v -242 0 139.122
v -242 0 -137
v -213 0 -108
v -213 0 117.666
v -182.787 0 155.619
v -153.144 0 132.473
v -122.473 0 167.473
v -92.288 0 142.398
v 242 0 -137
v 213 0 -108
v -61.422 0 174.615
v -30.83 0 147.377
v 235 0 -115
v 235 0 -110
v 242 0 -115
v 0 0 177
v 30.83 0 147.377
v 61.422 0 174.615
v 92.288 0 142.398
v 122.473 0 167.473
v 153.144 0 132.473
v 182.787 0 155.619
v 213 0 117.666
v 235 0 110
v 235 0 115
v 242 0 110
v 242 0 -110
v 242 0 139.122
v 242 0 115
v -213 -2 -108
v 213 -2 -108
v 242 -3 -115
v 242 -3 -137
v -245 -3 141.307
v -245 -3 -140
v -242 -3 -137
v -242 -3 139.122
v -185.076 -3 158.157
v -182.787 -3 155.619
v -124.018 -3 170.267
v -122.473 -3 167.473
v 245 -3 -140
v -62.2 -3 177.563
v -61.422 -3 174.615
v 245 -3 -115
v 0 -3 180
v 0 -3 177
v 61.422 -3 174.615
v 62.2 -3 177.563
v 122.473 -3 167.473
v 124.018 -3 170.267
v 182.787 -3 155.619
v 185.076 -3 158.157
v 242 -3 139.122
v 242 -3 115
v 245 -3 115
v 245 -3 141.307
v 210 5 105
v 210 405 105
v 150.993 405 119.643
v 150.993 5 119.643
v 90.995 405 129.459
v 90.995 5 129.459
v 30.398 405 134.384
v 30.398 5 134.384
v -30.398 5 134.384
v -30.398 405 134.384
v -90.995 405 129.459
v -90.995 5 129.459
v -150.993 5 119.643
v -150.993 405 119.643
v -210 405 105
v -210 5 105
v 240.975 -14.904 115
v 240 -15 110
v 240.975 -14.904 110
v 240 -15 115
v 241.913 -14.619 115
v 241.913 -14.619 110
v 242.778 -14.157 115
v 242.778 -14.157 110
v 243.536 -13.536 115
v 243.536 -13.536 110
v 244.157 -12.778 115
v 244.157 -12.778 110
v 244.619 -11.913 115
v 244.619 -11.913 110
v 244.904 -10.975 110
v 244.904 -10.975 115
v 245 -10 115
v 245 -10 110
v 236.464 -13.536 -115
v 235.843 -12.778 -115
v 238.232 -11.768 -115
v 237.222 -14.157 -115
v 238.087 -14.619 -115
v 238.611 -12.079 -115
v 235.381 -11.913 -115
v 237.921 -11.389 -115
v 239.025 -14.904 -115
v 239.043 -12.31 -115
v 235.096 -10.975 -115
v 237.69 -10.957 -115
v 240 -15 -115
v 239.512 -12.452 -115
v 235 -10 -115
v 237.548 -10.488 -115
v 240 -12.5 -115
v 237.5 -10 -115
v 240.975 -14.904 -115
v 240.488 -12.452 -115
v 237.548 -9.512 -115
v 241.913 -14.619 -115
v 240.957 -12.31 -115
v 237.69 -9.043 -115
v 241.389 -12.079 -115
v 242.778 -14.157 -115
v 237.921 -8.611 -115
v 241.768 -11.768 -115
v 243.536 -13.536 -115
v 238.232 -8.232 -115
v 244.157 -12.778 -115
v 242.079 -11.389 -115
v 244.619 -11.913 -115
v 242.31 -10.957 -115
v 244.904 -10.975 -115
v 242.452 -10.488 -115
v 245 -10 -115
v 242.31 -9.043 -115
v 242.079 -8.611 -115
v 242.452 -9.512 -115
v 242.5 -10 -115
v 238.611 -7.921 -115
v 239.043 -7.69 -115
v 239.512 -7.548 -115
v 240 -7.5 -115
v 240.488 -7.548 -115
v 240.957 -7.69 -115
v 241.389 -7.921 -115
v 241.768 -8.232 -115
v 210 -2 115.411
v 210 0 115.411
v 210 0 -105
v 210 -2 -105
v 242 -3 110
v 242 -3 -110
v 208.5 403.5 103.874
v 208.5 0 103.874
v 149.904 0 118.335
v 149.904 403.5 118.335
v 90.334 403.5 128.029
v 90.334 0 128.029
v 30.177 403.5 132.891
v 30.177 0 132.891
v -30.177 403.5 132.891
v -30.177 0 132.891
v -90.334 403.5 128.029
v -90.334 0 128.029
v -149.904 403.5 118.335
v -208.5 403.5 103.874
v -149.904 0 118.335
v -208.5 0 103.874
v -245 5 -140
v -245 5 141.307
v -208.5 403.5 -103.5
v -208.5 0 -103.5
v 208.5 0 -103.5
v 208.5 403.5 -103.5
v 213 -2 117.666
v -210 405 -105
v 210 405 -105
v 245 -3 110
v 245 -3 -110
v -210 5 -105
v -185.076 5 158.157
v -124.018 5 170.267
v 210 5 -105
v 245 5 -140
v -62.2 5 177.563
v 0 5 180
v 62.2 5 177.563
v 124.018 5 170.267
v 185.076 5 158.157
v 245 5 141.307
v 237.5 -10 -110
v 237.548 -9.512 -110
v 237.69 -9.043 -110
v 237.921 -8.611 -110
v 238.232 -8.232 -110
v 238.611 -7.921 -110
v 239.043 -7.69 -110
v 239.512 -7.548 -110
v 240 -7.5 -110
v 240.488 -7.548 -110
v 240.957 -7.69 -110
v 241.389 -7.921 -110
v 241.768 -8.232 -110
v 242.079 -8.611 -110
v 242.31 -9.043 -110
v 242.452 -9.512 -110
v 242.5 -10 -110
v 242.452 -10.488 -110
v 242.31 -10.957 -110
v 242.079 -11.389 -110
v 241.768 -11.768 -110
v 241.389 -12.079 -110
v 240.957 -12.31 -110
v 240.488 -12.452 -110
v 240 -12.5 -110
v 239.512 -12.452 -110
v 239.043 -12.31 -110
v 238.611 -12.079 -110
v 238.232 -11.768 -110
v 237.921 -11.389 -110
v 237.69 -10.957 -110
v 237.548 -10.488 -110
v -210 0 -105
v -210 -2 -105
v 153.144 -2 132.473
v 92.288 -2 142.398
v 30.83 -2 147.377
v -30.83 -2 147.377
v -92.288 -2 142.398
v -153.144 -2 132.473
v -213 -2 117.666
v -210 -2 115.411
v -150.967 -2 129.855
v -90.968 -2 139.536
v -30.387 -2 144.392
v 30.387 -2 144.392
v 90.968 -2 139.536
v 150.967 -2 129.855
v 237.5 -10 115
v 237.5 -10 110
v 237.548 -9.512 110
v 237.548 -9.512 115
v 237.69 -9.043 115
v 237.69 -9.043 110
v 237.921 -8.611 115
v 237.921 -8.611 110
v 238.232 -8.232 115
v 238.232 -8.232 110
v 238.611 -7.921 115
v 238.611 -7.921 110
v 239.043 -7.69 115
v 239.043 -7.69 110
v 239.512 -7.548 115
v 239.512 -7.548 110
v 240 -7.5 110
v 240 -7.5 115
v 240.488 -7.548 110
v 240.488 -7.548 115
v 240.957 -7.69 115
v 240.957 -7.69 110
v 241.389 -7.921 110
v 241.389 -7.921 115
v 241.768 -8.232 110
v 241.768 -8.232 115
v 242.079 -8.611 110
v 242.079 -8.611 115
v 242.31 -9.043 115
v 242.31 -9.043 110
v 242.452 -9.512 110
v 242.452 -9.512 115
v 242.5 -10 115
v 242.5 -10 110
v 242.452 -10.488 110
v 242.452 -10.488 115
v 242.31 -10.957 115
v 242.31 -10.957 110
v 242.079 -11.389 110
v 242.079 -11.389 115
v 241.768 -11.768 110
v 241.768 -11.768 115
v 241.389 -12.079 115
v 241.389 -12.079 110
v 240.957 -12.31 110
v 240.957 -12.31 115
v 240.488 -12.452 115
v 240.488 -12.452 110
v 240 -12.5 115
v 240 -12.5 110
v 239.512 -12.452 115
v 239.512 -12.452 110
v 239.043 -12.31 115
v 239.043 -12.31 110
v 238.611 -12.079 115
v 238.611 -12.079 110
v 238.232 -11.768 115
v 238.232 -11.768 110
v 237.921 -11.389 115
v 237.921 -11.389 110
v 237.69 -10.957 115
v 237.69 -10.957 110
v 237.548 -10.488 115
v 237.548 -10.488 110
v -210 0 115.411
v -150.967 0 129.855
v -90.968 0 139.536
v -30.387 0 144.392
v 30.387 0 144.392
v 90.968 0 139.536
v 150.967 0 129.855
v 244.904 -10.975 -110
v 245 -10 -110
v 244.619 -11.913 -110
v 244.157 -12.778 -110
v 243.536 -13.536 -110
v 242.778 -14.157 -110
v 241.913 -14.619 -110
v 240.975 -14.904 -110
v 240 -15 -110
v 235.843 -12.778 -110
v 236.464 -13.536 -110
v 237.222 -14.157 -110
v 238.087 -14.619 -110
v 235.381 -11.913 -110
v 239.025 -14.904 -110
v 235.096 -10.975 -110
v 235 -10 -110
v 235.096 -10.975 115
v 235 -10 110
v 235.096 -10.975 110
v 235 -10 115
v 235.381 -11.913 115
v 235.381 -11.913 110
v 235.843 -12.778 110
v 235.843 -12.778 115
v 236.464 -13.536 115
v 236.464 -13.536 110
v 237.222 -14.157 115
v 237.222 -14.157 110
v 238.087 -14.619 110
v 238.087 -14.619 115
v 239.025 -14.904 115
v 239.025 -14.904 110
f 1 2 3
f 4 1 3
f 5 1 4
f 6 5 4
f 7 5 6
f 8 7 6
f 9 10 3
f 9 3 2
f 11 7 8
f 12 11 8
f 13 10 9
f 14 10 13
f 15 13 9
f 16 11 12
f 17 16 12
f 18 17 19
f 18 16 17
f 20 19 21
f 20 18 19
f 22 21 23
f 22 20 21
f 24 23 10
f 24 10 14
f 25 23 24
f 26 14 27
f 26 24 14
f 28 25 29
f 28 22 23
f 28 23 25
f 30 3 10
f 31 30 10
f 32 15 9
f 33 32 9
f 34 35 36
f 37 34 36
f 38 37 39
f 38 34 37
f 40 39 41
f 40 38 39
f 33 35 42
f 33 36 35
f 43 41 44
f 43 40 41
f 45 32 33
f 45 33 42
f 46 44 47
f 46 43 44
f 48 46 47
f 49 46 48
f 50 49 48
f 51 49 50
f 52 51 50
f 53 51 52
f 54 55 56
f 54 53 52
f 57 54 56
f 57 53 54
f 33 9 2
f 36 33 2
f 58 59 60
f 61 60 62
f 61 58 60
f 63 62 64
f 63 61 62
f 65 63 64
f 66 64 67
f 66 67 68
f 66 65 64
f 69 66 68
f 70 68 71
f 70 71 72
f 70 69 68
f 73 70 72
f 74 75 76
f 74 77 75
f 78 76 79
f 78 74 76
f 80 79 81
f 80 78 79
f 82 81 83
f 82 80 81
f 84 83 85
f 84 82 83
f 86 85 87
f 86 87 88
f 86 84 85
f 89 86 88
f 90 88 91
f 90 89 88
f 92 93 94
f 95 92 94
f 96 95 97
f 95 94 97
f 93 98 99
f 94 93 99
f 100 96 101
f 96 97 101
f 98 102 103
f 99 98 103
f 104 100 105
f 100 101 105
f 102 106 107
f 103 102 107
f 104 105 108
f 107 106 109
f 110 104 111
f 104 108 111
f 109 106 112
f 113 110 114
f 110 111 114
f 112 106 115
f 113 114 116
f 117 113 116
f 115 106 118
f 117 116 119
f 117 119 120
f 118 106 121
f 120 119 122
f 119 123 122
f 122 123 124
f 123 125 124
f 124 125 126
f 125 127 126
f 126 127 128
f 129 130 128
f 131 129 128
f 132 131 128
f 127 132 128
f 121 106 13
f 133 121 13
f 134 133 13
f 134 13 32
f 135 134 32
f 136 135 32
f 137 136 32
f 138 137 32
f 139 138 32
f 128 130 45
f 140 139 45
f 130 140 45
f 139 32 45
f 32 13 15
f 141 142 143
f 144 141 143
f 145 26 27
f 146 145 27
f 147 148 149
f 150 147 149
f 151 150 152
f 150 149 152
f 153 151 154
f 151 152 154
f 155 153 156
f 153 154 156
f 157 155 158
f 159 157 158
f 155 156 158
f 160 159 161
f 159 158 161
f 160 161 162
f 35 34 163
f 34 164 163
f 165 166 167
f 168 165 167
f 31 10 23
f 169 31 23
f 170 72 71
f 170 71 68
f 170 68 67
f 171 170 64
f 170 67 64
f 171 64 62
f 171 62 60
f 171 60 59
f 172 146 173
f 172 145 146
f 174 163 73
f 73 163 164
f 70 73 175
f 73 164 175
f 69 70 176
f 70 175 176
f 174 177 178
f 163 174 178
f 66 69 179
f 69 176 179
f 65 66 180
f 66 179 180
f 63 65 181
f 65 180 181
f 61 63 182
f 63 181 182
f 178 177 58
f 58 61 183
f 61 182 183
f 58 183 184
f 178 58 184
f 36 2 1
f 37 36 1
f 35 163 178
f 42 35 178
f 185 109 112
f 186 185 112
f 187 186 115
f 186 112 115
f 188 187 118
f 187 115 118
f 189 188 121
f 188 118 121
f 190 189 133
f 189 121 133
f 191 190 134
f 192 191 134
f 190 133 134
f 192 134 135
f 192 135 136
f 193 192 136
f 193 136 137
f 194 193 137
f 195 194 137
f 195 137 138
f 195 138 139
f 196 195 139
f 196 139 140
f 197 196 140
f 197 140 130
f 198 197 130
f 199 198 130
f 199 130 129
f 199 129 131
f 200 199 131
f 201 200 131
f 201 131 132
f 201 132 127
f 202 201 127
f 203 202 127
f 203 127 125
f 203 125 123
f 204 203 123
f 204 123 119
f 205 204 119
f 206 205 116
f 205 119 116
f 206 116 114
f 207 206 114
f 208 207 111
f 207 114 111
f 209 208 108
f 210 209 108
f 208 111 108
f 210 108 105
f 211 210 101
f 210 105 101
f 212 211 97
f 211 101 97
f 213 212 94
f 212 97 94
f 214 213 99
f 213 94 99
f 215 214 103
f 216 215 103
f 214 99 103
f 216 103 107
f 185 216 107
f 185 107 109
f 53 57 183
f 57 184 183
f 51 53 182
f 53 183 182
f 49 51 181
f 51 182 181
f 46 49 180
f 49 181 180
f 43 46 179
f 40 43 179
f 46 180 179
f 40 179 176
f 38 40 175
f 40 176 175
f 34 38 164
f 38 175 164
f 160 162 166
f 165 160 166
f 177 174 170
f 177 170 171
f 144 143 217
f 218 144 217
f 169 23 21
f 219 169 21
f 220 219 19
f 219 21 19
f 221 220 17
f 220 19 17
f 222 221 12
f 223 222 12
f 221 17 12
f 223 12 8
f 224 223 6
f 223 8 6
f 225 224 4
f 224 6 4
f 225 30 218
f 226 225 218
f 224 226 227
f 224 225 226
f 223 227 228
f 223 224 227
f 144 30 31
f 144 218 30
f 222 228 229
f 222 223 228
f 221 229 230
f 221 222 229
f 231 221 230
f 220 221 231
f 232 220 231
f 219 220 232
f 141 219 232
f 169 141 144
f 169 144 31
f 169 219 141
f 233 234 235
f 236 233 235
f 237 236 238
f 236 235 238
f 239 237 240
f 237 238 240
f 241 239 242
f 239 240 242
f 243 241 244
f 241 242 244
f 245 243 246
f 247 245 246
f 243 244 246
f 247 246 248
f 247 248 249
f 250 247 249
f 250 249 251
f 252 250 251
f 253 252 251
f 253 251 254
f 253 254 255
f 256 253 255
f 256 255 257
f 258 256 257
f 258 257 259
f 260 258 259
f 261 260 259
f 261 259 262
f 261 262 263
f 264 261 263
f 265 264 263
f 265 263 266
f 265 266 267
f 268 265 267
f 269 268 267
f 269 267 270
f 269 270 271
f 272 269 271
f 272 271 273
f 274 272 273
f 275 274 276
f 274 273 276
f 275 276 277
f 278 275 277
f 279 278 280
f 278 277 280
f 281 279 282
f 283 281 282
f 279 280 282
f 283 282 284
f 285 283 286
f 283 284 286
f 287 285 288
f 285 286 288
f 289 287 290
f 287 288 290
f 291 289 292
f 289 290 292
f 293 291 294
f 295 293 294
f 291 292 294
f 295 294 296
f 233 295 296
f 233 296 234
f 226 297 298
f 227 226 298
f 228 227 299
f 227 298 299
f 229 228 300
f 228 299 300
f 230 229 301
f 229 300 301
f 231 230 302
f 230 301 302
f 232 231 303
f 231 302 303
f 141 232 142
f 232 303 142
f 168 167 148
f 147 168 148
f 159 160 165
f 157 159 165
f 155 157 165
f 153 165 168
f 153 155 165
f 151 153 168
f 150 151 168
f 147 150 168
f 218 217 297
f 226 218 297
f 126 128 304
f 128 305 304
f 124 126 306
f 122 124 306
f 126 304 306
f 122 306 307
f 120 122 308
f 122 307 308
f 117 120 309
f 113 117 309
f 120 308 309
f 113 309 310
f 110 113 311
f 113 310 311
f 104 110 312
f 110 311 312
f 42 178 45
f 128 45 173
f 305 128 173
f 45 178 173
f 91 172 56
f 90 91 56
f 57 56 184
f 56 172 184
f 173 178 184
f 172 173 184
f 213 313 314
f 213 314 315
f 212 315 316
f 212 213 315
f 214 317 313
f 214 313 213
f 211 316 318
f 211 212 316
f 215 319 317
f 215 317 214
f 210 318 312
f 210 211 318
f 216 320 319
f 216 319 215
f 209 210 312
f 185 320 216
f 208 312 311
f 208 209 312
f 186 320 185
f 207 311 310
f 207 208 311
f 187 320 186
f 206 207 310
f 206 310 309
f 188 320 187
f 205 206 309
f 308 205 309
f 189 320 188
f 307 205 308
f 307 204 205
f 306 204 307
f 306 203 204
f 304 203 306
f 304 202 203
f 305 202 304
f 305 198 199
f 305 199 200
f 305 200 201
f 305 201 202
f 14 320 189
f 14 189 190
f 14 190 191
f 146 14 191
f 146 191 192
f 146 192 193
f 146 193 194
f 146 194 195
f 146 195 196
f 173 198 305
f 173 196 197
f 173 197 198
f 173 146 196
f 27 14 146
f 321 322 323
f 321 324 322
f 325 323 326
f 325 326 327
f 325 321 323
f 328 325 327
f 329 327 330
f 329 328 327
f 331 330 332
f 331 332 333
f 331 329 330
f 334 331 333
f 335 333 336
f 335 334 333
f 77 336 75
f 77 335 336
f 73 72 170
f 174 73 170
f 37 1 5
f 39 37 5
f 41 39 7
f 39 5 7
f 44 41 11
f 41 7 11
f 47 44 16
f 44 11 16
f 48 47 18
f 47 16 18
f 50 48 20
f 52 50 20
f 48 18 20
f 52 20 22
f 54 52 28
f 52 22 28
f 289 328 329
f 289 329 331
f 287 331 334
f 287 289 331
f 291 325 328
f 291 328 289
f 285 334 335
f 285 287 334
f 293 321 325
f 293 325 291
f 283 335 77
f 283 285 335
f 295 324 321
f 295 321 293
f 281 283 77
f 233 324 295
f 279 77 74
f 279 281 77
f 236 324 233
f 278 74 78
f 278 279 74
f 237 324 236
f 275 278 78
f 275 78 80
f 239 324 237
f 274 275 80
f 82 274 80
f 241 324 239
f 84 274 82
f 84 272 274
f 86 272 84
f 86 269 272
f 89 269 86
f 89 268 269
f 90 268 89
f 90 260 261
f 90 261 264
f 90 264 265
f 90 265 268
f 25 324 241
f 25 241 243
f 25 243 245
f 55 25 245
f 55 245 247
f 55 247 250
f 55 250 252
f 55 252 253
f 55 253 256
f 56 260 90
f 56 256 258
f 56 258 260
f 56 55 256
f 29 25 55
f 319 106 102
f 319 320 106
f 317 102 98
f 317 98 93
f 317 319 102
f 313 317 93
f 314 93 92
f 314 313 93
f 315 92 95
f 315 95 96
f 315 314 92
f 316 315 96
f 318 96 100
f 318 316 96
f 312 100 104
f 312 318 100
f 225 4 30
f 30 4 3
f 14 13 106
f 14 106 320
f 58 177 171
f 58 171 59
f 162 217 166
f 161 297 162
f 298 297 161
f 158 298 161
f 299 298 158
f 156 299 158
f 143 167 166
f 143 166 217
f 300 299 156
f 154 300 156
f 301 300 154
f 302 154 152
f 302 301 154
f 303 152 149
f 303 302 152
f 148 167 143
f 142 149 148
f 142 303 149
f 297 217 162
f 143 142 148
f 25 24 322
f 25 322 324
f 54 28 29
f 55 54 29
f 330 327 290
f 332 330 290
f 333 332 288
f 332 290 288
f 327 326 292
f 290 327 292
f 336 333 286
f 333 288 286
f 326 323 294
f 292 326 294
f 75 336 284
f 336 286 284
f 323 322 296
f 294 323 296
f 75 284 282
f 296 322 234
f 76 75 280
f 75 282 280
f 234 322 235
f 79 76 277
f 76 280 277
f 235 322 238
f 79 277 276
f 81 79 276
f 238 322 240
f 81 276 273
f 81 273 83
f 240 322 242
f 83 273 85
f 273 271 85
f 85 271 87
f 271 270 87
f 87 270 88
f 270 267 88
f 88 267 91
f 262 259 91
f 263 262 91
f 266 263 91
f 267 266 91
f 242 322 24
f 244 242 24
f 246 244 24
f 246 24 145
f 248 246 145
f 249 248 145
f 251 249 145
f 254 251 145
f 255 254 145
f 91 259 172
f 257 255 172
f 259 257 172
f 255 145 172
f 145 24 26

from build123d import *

# Parameters (mm, degrees)
F1_DEPTH = 405
F2_T     = -1.5
F3_DEPTH = 5
F5_DEPTH = 3
F6_DEPTH = 2
F7_W     = 10
F7_H     = 5
F8_DEPTH = 15
F9_R     = 4.99999
F11_D    = 5


# Not quite as in the source:
# - a fillet or chamfer is up to 0.001 mm smaller than in the source, because OpenCascade refuses the exact size


with BuildPart() as f1:
    # F0 (on Front) → F1 (new body)
    with BuildSketch(Plane.XZ):
        with BuildLine():
            Line((-210, -105), (210, -105))
            Line((210, -105), (210, 105))
            ThreePointArc((210, 105), (0, 135), (-210, 105))
            Line((-210, 105), (-210, -105))
        make_face()
    extrude(amount=-F1_DEPTH)

    # F2
    f2_openings = [f1.faces().sort_by_distance(p)[0] for p in [
        (0, 0, 10.213522),
    ]]
    offset(amount=F2_T, openings=f2_openings)

    # F0 (on Front) → F3 (join)
    with BuildSketch(Plane.XZ):
        with BuildLine():
            ThreePointArc((245, 141.3068160476), (0, 180), (-245, 141.3068160476))
            Line((-245, 141.3068160476), (-245, -140))
            Line((-245, -140), (245, -140))
            Line((245, -140), (245, 141.3068160476))
        make_face()
        with BuildLine():
            Line((210, 105), (210, -105))
            Line((210, -105), (-210, -105))
            Line((-210, -105), (-210, 105))
            ThreePointArc((-210, 105), (0, 135), (210, 105))
        make_face(mode=Mode.SUBTRACT)
    extrude(amount=-F3_DEPTH)

    # F4 (on face) → F5 (join)
    with BuildSketch(Plane.XZ):
        with BuildLine():
            Line((245, -140), (245, 141.3068160476))
            ThreePointArc((245, 141.3068160476), (0, 180), (-245, 141.3068160476))
            Line((-245, 141.3068160476), (-245, -140))
            Line((-245, -140), (245, -140))
        make_face()
        with BuildLine():
            Line((-242, -137), (-242, 139.1220060441))
            ThreePointArc((-242, 139.1220060441), (0, 177), (242, 139.1220060441))
            Line((242, 139.1220060441), (242, -137))
            Line((242, -137), (-242, -137))
        make_face(mode=Mode.SUBTRACT)
    extrude(amount=F5_DEPTH)

    # F4 (on face) → F6 (join)
    with BuildSketch(Plane.XZ):
        with BuildLine():
            ThreePointArc((213, 117.6663633606), (0, 148), (-213, 117.6663633606))
            Line((-213, 117.6663633606), (-213, -108))
            Line((-213, -108), (213, -108))
            Line((213, -108), (213, 117.6663633606))
        make_face()
        with BuildLine():
            ThreePointArc((-210, 115.410843293), (0, 145), (210, 115.410843293))
            Line((210, 115.410843293), (210, 105))
            Line((210, 105), (210, -105))
            Line((210, -105), (-210, -105))
            Line((-210, -105), (-210, 105))
            Line((-210, 105), (-210, 115.410843293))
        make_face(mode=Mode.SUBTRACT)
    extrude(amount=F6_DEPTH)

    # F7 (on face) → F8 (join)
    with BuildSketch(Plane.XZ):
        with Locations((240, 112.5)):
            Rectangle(F7_W, F7_H)
        with Locations((240, -112.5)):
            Rectangle(F7_W, F7_H)
    extrude(amount=F8_DEPTH)

    # F9 (radius 5 in the source; OpenCascade refuses exactly that, so slightly less here)
    f9_edges = [f1.edges().sort_by_distance(p)[0] for p in [
        (245, -15, 112.5),
        (235, -15, 112.5),
        (245, -15, -112.5),
        (235, -15, -112.5),
    ]]
    fillet(f9_edges, radius=F9_R)

    # F11 (through all)
    with Locations(Plane.XY.offset(115)):
        with Locations((240, -10)):
            Hole(F11_D / 2)


solid = f1.part
